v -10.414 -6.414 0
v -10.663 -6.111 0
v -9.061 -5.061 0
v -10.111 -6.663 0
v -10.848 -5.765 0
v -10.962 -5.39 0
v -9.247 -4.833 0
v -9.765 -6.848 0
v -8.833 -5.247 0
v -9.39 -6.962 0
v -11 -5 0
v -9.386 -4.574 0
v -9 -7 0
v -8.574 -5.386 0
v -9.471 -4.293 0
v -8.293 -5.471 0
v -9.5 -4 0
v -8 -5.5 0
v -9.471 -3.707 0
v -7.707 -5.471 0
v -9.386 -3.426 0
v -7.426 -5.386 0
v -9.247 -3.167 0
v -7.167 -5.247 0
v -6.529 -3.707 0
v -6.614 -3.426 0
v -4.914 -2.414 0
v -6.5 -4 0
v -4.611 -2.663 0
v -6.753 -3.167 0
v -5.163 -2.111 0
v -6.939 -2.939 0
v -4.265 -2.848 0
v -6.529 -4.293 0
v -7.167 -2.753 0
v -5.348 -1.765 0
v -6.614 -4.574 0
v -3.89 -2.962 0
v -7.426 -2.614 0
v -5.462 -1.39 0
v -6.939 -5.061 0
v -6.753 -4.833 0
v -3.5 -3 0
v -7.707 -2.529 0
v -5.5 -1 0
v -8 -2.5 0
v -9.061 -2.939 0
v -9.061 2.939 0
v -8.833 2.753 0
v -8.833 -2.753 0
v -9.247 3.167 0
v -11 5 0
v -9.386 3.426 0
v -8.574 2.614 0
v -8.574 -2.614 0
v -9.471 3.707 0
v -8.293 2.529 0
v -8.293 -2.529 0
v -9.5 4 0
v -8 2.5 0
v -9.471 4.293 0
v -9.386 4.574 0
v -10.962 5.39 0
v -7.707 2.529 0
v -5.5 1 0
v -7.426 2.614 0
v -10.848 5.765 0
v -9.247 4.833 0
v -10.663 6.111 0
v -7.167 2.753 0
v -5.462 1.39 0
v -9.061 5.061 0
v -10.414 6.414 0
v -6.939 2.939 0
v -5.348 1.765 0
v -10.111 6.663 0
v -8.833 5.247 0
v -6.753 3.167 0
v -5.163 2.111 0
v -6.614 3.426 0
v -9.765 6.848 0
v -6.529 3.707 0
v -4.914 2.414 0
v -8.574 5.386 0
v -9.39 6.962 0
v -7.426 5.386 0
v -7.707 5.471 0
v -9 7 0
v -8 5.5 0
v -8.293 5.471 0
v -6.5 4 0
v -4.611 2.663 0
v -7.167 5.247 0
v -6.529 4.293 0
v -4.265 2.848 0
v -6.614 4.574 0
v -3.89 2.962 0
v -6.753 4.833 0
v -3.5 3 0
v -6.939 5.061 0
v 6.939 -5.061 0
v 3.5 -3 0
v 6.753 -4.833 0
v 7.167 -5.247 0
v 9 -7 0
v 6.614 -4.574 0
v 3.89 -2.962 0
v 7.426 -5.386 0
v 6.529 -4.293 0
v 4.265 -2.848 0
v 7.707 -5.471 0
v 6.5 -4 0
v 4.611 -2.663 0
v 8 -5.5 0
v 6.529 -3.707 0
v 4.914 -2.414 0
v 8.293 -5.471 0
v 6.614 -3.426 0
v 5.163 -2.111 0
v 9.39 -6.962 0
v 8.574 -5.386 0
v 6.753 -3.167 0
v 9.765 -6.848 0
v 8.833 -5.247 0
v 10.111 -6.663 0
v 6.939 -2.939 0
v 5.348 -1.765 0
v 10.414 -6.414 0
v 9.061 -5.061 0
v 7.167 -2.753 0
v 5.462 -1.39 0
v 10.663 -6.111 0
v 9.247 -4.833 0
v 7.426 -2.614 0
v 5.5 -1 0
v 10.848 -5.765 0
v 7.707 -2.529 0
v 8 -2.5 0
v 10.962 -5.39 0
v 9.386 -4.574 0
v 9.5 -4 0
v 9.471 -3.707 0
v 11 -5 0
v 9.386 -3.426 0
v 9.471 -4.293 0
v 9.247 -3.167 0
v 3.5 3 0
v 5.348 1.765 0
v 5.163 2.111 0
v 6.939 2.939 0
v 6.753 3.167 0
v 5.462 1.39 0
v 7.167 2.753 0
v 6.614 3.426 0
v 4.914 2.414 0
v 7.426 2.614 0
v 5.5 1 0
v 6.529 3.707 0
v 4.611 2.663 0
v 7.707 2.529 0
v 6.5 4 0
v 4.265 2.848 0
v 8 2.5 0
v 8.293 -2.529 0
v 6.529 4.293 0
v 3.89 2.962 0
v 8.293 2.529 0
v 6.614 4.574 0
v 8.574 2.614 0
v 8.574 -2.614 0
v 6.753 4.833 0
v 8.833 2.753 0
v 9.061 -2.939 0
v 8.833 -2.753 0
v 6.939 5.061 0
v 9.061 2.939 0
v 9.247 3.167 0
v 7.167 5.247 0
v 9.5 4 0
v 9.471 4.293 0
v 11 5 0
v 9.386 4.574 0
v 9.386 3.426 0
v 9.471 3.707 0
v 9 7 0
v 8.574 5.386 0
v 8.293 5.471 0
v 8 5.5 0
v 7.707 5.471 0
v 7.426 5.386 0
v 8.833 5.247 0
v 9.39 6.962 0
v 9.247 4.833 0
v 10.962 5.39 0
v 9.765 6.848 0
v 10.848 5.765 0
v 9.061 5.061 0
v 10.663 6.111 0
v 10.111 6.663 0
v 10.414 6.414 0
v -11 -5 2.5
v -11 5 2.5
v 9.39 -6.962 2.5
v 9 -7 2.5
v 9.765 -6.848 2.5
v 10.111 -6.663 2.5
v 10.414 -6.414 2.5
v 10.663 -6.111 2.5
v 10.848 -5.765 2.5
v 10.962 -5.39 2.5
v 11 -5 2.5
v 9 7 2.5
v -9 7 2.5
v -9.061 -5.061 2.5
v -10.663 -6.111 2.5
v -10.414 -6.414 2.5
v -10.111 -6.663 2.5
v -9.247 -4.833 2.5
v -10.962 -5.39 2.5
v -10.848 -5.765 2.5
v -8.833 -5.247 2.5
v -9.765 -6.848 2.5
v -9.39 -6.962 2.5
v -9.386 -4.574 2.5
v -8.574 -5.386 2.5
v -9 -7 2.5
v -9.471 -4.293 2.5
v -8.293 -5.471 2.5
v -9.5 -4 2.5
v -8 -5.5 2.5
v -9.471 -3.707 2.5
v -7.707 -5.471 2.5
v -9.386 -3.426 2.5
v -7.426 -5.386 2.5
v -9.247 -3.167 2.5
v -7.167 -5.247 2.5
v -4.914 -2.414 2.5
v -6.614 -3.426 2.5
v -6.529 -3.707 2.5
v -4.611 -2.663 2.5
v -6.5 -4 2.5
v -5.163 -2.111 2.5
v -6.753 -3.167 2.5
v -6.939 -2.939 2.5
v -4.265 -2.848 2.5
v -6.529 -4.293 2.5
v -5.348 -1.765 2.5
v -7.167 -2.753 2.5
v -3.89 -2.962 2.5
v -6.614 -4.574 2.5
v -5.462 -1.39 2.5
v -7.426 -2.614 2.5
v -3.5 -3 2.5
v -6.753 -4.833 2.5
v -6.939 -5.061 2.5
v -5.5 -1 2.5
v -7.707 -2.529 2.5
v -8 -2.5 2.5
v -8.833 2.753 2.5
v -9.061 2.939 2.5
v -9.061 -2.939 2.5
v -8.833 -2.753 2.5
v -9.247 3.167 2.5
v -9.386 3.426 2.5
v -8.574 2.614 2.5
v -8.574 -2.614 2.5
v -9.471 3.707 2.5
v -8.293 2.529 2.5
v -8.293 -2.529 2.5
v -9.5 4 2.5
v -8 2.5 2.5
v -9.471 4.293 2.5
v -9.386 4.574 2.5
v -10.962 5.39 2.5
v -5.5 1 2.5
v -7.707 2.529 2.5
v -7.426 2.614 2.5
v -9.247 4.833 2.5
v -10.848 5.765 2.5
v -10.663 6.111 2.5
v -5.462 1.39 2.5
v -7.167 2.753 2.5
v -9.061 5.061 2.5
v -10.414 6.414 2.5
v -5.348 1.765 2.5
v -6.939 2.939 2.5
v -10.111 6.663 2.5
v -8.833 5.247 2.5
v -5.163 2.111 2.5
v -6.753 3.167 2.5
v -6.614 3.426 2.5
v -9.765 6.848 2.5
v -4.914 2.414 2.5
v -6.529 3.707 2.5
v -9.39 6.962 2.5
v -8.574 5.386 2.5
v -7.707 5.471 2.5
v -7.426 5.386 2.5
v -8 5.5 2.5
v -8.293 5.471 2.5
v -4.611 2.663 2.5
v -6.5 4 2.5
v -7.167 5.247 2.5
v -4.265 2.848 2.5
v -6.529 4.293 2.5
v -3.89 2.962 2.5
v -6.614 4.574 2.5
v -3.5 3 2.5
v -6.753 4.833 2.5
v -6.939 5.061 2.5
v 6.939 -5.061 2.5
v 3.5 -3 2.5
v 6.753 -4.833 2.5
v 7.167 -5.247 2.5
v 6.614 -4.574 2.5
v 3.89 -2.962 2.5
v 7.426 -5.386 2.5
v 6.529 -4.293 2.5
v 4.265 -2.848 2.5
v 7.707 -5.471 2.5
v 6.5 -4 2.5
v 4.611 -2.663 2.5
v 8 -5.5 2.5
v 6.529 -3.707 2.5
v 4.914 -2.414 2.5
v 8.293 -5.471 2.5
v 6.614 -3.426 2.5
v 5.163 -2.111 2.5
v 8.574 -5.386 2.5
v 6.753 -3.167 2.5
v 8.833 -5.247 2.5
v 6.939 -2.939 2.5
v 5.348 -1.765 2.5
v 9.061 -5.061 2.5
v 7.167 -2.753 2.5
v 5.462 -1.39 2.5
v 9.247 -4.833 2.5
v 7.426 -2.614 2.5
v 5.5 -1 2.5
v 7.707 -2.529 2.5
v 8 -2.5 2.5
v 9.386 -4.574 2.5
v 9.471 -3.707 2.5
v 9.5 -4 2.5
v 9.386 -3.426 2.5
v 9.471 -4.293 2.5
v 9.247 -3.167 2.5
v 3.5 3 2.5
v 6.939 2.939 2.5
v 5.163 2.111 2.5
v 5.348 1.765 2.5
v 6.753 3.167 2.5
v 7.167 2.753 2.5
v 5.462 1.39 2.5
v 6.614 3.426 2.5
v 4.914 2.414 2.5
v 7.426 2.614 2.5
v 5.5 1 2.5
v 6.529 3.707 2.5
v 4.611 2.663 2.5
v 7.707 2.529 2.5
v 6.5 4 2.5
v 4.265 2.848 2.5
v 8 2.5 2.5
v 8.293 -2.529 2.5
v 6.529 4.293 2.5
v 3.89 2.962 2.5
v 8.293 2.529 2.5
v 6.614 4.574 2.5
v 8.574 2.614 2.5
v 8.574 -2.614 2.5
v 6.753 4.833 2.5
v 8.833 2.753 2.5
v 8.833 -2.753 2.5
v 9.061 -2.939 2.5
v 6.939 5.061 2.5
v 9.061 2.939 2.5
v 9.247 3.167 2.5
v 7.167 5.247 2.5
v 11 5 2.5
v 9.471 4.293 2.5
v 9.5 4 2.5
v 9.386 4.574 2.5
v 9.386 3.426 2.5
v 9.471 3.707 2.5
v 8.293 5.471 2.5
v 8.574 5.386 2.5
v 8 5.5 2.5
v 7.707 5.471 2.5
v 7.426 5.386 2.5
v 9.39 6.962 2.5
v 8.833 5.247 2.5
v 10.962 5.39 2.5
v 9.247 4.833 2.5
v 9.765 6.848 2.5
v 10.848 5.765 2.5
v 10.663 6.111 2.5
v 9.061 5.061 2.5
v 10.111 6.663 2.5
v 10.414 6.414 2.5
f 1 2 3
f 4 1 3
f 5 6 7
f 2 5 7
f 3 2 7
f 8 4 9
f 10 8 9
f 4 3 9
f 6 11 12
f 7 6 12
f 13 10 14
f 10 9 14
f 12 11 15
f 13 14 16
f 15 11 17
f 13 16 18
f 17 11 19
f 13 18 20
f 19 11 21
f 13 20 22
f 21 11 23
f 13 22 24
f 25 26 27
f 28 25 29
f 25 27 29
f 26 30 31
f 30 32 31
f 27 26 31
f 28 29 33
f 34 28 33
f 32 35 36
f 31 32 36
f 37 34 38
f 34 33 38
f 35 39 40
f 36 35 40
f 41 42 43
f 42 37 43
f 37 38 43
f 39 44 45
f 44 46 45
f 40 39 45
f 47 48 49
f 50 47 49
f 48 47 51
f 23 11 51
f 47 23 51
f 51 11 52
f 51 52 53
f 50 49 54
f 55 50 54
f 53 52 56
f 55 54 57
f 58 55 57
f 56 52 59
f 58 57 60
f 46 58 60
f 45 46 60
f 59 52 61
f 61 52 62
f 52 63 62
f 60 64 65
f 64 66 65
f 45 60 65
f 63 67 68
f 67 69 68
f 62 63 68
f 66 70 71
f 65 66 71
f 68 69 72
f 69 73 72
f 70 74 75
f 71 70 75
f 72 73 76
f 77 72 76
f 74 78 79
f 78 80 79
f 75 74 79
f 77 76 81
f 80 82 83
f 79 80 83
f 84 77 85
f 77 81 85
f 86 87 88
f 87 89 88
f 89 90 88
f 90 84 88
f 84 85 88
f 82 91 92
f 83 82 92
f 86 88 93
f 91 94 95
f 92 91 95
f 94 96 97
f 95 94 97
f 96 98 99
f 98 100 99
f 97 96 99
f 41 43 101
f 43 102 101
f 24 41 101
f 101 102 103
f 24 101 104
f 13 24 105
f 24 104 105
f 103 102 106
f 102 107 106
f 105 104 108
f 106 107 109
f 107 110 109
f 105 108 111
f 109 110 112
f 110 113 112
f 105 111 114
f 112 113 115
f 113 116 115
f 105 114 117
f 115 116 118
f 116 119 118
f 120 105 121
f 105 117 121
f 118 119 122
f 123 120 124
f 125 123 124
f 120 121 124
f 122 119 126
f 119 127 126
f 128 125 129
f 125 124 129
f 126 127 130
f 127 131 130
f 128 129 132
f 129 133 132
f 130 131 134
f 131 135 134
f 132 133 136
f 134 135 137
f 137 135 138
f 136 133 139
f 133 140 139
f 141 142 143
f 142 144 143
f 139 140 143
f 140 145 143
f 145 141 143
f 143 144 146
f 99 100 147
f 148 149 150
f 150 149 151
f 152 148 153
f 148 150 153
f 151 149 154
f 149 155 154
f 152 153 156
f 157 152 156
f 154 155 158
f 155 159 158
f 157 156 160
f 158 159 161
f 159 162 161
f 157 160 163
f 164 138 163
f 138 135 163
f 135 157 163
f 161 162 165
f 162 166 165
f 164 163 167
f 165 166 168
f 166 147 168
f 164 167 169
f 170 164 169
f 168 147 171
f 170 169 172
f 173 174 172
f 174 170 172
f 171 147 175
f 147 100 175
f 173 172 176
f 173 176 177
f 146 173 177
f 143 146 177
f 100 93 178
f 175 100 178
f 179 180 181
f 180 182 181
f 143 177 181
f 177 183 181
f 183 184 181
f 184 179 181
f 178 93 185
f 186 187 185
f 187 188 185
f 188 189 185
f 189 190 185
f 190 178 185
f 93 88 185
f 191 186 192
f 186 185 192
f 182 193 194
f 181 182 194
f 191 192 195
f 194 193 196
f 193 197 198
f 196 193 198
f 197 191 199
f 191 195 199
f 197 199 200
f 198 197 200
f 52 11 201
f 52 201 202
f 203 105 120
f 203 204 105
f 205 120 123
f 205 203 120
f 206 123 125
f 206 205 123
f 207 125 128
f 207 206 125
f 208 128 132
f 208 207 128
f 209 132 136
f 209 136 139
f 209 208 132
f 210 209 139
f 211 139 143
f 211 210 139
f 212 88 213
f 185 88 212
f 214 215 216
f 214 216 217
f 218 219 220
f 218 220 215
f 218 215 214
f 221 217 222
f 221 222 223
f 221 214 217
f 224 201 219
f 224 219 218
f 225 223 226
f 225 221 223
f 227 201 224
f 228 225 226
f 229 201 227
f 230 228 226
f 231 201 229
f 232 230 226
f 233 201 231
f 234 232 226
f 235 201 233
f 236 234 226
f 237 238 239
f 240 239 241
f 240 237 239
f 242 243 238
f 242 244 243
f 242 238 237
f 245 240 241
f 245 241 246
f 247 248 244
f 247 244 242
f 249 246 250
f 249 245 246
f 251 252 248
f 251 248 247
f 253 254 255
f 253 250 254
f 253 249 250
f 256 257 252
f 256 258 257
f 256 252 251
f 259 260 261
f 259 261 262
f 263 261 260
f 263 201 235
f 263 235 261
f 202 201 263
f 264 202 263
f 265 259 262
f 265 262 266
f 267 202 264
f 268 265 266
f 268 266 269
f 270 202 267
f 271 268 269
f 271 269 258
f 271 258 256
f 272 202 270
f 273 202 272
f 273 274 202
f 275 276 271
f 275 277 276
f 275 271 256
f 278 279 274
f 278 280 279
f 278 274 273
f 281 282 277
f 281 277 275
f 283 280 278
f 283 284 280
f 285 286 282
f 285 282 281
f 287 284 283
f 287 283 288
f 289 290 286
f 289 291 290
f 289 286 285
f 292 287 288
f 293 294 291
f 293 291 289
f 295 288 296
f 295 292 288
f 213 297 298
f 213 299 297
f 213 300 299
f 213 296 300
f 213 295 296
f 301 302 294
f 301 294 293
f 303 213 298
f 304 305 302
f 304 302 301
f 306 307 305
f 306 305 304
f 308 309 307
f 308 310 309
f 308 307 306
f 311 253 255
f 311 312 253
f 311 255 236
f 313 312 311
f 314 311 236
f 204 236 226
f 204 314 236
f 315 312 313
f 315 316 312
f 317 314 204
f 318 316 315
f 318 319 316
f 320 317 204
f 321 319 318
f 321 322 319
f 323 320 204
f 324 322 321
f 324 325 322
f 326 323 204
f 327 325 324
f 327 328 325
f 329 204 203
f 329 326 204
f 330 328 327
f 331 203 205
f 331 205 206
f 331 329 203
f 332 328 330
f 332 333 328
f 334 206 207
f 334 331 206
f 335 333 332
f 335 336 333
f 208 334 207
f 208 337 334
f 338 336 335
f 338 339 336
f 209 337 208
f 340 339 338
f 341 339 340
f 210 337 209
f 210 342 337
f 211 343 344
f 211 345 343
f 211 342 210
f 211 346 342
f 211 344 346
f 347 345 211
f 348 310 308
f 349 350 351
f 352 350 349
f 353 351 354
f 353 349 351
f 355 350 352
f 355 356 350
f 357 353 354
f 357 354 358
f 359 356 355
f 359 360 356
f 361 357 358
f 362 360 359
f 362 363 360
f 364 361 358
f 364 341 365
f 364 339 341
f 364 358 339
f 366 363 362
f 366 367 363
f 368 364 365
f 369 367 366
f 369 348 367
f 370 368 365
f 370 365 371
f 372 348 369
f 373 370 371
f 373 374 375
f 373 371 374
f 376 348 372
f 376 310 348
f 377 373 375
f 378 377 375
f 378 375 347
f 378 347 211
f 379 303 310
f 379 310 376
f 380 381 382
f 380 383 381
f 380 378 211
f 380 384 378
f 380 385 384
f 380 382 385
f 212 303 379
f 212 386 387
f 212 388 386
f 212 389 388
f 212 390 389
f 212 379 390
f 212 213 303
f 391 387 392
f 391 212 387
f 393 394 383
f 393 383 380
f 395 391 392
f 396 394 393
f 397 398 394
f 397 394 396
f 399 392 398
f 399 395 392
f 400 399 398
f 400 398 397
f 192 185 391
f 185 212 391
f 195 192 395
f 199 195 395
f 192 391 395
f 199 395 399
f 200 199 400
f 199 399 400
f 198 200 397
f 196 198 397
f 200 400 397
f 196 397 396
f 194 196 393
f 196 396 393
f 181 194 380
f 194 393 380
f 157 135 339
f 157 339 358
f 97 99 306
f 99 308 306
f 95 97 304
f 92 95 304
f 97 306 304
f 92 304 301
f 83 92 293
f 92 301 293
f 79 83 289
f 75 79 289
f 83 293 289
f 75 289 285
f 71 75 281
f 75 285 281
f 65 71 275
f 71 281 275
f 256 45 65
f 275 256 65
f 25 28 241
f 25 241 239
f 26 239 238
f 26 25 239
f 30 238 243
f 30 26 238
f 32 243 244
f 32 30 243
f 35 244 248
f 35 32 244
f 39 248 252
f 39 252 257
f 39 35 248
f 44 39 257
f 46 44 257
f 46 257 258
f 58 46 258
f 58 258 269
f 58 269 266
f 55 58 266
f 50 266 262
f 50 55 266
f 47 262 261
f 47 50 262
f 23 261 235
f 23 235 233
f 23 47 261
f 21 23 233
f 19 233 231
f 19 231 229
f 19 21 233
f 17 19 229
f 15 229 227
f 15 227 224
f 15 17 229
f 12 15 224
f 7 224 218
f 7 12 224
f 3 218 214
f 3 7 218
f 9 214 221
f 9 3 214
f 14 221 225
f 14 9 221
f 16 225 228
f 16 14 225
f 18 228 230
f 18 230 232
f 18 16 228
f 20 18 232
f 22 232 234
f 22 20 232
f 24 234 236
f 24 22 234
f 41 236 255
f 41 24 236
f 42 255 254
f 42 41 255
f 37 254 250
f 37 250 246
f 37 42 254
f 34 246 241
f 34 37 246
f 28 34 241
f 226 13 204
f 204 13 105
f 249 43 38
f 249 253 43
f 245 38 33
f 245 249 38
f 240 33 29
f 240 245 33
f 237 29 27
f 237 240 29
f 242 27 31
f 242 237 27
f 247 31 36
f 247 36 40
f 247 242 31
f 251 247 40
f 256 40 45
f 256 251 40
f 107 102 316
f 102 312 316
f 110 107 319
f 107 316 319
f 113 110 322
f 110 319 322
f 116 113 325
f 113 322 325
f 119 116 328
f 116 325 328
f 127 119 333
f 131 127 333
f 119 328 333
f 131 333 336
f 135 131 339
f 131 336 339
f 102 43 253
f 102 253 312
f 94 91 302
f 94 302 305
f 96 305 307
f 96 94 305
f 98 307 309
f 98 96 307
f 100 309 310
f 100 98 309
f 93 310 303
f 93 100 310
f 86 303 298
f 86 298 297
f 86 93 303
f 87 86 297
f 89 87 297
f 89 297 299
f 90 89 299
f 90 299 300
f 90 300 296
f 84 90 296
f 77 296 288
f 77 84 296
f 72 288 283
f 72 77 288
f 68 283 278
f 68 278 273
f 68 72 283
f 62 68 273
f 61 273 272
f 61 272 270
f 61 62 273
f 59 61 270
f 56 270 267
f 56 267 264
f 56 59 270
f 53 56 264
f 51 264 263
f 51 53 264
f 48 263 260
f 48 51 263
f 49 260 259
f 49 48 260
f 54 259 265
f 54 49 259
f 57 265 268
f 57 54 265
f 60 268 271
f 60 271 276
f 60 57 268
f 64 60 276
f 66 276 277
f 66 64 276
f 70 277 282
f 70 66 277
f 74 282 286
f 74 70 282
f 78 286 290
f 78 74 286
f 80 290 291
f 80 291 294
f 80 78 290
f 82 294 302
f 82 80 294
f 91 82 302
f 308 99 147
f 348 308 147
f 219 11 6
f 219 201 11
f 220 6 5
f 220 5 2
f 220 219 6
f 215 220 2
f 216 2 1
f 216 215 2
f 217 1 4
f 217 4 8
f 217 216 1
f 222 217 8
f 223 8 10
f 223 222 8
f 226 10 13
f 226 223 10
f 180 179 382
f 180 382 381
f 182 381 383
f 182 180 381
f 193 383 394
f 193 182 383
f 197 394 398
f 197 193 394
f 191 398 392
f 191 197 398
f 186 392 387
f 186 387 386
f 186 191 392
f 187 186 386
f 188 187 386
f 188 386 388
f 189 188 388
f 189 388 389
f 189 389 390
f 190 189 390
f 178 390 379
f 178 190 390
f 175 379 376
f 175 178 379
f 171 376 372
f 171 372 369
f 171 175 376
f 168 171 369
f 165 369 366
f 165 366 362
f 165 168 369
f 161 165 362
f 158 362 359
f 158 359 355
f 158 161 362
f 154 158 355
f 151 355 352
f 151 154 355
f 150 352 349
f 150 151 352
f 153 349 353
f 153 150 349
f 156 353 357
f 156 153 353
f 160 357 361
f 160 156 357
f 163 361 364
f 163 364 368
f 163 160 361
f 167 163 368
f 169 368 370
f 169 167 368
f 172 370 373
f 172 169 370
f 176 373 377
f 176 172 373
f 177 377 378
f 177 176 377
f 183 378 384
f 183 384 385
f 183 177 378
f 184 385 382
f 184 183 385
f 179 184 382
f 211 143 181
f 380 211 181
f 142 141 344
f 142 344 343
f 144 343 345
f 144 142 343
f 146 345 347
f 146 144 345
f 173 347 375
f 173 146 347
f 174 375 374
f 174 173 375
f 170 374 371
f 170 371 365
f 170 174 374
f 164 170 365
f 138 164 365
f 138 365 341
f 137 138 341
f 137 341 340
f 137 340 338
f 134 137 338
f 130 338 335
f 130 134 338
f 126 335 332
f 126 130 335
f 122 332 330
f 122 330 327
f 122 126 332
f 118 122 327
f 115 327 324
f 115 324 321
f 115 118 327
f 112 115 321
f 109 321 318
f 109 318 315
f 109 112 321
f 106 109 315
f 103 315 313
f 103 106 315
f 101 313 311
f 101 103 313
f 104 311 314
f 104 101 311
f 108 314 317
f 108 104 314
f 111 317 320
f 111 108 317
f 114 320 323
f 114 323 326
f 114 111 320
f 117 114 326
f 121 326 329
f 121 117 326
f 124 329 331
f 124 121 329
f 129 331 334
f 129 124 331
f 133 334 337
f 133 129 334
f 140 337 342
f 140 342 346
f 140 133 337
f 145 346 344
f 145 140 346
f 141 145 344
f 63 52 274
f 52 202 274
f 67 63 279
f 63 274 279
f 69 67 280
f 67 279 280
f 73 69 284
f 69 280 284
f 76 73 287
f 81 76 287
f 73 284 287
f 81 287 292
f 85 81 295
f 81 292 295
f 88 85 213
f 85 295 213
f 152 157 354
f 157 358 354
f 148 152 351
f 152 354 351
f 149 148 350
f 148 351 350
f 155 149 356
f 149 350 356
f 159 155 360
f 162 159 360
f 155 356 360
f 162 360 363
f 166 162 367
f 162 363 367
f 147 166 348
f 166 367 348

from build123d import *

# Parameters (mm, degrees)
SKETCH_1_W      = 22
SKETCH_1_H      = 14
SKETCH_1_R      = 1.5
SKETCH_1_W_2    = 11
SKETCH_1_H_2    = 6
EXTRUDE_1_DEPTH = 2.5
FILLET_1_R      = 2


with BuildPart() as part:
    # 草图1 → 凸台-拉伸1 (new body)
    with BuildSketch(Plane.XY):
        Rectangle(SKETCH_1_W, SKETCH_1_H)
        with Locations((8, 4)):
            Circle(SKETCH_1_R, mode=Mode.SUBTRACT)
        with Locations((8, -4)):
            Circle(SKETCH_1_R, mode=Mode.SUBTRACT)
        with Locations((-8, -4)):
            Circle(SKETCH_1_R, mode=Mode.SUBTRACT)
        with Locations((-8, 4)):
            Circle(SKETCH_1_R, mode=Mode.SUBTRACT)
        Rectangle(SKETCH_1_W_2, SKETCH_1_H_2, mode=Mode.SUBTRACT)
    extrude(amount=EXTRUDE_1_DEPTH)

    # 圆角1
    fillet_1_edges = [part.edges().sort_by_distance(p)[0] for p in [
        (5.5, -3, 1.25),
        (5.5, 3, 1.25),
        (-5.5, 3, 1.25),
        (-5.5, -3, 1.25),
        (11, -7, 1.25),
        (-11, -7, 1.25),
        (-11, 7, 1.25),
        (11, 7, 1.25),
    ]]
    fillet(fillet_1_edges, radius=FILLET_1_R)


solid = part.part
